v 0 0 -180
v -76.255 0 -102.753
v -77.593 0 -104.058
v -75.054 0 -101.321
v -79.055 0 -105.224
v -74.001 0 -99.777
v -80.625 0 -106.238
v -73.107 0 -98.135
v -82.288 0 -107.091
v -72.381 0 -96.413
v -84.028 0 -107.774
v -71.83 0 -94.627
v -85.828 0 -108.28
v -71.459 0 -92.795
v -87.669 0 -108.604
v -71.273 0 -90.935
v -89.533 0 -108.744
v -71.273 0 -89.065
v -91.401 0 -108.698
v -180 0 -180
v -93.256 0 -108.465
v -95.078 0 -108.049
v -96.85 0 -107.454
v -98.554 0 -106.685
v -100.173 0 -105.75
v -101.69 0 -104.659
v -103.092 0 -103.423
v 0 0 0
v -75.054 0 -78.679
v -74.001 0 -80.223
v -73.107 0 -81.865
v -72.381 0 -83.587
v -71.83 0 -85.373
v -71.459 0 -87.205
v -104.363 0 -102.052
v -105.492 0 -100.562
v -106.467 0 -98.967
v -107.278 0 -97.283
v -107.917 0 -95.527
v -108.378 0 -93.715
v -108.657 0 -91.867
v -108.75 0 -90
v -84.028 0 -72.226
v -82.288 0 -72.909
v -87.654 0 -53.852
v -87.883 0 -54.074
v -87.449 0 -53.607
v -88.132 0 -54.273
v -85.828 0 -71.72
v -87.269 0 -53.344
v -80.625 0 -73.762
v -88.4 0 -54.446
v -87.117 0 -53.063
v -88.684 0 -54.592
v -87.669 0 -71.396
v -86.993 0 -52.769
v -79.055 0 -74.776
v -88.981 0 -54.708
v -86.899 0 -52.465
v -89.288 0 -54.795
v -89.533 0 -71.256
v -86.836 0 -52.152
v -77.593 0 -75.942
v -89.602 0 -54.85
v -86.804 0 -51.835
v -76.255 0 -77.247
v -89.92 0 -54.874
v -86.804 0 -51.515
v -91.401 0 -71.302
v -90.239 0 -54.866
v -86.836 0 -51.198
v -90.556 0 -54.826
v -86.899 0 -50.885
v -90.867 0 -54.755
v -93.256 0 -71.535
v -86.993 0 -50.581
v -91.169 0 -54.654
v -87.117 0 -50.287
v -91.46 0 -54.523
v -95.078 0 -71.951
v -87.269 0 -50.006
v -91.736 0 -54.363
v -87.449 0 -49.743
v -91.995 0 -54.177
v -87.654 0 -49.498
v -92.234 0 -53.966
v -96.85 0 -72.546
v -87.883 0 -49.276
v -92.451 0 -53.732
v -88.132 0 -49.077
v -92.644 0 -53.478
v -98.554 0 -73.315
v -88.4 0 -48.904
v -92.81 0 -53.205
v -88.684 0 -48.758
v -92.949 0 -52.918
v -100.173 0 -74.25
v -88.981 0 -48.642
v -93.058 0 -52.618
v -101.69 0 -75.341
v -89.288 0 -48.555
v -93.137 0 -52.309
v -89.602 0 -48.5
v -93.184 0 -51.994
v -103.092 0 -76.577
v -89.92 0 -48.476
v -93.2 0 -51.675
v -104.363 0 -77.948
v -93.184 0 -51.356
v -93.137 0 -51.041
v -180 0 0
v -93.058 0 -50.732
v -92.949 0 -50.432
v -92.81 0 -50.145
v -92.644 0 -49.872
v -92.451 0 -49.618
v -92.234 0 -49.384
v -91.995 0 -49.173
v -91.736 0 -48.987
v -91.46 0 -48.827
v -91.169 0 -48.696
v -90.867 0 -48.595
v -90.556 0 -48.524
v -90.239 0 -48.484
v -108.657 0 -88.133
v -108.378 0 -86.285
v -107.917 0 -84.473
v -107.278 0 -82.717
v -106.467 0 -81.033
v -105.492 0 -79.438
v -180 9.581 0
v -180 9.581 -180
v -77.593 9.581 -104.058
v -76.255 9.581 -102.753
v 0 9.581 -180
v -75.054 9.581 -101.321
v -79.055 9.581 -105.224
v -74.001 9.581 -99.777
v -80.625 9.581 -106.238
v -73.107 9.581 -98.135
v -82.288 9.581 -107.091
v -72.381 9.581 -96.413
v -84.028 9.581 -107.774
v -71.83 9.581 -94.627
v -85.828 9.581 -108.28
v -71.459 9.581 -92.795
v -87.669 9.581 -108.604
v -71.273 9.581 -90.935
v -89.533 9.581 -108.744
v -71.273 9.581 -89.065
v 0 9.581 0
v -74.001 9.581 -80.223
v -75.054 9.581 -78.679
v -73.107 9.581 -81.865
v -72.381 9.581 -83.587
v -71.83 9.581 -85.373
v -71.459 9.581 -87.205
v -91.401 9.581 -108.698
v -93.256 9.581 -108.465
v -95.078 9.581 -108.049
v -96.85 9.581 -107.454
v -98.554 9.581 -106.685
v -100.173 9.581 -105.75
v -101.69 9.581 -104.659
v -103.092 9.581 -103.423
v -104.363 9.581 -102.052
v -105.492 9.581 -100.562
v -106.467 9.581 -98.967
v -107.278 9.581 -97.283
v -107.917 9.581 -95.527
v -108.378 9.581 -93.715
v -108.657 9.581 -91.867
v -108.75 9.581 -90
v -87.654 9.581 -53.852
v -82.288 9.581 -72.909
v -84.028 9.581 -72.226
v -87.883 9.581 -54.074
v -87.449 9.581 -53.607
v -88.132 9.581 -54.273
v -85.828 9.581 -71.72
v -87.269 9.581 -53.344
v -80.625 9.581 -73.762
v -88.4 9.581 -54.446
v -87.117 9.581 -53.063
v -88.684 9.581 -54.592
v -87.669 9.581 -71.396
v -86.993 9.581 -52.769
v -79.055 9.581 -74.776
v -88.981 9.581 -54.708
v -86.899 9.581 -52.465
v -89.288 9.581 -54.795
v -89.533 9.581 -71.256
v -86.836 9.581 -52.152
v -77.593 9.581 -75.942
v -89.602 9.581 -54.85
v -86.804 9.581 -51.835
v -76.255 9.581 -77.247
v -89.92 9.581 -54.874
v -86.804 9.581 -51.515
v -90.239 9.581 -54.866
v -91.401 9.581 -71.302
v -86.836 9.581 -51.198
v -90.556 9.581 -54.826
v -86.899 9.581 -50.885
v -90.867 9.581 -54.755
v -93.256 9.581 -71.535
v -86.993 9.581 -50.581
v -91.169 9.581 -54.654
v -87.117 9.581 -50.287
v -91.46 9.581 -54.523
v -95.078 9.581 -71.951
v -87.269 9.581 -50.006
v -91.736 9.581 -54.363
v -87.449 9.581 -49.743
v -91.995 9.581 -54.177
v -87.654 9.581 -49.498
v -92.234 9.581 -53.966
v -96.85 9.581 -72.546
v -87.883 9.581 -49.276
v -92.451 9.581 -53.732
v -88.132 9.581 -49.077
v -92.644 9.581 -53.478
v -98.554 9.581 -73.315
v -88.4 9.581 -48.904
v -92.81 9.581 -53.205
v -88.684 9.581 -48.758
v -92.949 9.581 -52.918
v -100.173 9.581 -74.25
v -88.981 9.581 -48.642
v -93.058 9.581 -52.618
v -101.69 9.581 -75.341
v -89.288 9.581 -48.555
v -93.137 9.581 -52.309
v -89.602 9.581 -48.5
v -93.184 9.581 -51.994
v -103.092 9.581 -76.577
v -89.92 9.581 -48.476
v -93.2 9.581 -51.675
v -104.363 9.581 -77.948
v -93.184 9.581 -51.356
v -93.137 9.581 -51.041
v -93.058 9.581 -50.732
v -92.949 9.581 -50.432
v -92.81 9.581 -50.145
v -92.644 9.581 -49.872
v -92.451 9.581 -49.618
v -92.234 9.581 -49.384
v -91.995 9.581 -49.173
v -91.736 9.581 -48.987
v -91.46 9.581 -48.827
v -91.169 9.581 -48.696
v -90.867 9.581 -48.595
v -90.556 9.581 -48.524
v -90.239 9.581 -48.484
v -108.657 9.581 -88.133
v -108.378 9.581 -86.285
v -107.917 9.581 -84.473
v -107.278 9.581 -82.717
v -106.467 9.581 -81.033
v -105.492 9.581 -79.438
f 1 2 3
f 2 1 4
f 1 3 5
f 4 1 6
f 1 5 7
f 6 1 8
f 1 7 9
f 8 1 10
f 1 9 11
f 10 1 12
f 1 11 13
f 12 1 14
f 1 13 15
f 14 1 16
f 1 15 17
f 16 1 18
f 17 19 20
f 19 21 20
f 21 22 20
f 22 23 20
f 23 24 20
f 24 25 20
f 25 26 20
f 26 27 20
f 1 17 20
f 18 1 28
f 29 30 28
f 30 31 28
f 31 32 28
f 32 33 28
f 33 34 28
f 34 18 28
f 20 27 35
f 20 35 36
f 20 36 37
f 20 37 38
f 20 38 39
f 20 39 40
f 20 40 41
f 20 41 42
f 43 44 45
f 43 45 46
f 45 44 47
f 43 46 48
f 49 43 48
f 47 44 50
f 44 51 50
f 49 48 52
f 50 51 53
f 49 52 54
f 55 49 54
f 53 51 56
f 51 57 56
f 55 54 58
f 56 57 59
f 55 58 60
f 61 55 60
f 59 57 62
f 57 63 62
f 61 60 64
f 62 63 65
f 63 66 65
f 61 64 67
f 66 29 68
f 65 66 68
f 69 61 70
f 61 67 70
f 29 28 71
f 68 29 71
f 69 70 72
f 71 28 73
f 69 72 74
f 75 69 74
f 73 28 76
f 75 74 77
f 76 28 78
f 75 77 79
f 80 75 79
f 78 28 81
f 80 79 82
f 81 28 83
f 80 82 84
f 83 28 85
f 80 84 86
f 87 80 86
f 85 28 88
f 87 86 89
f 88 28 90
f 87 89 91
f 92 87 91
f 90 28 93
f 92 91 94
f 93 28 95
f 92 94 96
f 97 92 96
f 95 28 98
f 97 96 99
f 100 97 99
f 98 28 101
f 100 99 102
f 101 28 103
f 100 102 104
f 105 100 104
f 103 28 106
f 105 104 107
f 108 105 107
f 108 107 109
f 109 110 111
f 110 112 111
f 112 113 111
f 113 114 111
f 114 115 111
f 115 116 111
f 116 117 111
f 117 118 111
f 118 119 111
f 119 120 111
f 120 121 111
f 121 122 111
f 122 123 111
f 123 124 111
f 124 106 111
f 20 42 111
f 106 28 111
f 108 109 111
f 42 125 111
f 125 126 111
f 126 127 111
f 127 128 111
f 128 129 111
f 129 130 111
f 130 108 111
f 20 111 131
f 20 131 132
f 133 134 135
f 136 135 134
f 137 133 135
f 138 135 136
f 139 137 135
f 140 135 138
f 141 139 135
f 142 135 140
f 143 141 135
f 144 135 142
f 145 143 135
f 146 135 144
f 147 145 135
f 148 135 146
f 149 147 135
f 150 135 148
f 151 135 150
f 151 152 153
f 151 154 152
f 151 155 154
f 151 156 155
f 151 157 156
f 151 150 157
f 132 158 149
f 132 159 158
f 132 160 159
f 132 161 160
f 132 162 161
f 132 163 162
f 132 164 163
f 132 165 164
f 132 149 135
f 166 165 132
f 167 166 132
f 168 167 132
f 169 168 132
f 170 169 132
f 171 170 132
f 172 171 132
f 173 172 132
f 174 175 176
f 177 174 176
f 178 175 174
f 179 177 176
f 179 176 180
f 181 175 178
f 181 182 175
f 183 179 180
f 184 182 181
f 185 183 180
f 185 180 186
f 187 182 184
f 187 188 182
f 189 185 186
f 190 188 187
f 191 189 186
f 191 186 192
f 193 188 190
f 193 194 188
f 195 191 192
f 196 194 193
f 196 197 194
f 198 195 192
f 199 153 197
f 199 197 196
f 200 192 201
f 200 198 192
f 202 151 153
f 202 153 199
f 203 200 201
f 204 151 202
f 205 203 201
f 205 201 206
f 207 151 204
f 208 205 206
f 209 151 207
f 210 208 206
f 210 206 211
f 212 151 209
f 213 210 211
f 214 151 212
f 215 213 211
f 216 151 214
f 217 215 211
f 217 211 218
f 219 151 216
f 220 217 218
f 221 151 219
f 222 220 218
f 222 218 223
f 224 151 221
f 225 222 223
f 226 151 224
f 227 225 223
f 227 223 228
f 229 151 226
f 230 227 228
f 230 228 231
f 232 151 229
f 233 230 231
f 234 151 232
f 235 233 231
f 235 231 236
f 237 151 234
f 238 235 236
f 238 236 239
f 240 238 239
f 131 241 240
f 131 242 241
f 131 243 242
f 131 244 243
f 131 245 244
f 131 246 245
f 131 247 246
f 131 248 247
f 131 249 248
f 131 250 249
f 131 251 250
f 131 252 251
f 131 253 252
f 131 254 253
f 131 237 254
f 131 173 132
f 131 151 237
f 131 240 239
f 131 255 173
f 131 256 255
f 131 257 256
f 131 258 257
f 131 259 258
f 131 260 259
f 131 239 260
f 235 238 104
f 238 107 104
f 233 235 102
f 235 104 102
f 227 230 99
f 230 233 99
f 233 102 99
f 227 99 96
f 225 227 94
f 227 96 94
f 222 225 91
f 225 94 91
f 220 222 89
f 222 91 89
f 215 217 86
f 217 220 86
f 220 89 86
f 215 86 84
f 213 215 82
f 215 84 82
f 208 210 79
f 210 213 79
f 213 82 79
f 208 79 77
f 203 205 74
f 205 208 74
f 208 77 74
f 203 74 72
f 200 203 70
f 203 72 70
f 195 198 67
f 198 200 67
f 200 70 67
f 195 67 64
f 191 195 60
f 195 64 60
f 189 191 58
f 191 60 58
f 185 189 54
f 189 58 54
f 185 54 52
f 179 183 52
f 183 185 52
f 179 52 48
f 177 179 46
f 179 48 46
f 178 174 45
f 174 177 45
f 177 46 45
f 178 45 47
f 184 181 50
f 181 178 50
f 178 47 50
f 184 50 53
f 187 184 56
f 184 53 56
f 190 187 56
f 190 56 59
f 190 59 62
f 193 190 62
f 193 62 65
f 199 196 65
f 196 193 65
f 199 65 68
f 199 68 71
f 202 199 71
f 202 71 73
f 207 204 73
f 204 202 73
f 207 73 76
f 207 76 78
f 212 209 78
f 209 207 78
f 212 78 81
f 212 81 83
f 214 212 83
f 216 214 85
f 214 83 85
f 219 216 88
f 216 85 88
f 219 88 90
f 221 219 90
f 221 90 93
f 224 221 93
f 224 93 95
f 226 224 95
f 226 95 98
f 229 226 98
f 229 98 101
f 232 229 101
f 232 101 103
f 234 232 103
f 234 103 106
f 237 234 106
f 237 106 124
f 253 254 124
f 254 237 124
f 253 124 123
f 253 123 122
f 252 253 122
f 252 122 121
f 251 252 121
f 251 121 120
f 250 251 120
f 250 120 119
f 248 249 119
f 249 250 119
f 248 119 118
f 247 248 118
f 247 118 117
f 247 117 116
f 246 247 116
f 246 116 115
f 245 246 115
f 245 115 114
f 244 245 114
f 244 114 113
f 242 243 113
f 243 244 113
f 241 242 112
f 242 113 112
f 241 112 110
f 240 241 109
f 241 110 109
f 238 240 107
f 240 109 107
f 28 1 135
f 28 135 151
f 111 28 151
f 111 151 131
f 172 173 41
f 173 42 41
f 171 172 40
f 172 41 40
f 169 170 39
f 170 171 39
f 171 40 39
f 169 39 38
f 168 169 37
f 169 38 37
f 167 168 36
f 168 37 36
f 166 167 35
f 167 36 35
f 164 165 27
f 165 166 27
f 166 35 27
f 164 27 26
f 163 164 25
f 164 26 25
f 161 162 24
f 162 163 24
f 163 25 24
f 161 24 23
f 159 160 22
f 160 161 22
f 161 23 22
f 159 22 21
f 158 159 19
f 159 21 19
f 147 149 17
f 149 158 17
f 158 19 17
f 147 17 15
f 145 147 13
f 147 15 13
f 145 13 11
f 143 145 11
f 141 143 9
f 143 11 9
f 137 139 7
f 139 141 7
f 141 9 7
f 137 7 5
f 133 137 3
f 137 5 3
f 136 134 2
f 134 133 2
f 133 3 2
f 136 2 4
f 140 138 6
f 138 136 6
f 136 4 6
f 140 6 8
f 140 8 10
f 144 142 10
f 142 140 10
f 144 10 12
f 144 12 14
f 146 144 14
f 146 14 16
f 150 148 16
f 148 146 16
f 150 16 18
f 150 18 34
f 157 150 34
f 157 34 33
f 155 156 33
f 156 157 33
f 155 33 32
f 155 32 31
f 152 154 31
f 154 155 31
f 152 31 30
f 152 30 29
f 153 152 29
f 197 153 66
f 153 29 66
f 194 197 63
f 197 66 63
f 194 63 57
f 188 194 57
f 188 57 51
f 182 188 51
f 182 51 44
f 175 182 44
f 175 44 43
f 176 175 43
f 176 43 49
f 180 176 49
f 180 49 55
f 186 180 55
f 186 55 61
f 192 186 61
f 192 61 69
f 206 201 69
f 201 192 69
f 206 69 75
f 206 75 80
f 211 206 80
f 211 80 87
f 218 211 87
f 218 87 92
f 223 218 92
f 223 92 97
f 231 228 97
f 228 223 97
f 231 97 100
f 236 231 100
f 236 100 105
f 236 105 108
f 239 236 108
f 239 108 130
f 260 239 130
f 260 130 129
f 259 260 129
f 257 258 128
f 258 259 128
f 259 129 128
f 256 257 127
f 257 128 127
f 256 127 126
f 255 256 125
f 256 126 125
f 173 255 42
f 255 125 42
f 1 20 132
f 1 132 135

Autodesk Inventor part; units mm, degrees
ref_plane "YZ Plane" through (0, 0, 0) normal (1, 0, 0) x (0, 1, 0)
ref_plane "XZ Plane" through (0, 0, 0) normal (0, 1, 0) x (-1, 0, 0)
ref_plane "XY Plane" through (0, 0, 0) normal (0, 0, 1) x (1, 0, 0)
sketch "Sketch1" plane through (0, 0, 0) normal (0, 1, 0) x (-1, 0, 0)
  line L0 (0, 0) -> (180, 0)
  line L1 (180, 0) -> (180, -180)
  line L2 (180, -180) -> (0, -180)
  line L3 (0, -180) -> (0, 0)
  circle A0 centre (90, -90) radius 18.75
  circle A1 centre (90, -51.675) radius 3.2
  line L4 (90, -51.675) -> (90, -90) construction
  point P0 (180, -90)
  point P1 (90, -180)
  dimension "d0" = 180
  dimension "d1" = 180
  dimension "d2" = 37.5
  dimension "d3" = 0
  dimension "d4" = 0
  dimension "d5" = 6.4
  dimension "d6" = 38.325
extrude "Extrusion1" add sketch "Sketch1" along normal blind 9.5813
properties part number "base_plate" material "Pine"
